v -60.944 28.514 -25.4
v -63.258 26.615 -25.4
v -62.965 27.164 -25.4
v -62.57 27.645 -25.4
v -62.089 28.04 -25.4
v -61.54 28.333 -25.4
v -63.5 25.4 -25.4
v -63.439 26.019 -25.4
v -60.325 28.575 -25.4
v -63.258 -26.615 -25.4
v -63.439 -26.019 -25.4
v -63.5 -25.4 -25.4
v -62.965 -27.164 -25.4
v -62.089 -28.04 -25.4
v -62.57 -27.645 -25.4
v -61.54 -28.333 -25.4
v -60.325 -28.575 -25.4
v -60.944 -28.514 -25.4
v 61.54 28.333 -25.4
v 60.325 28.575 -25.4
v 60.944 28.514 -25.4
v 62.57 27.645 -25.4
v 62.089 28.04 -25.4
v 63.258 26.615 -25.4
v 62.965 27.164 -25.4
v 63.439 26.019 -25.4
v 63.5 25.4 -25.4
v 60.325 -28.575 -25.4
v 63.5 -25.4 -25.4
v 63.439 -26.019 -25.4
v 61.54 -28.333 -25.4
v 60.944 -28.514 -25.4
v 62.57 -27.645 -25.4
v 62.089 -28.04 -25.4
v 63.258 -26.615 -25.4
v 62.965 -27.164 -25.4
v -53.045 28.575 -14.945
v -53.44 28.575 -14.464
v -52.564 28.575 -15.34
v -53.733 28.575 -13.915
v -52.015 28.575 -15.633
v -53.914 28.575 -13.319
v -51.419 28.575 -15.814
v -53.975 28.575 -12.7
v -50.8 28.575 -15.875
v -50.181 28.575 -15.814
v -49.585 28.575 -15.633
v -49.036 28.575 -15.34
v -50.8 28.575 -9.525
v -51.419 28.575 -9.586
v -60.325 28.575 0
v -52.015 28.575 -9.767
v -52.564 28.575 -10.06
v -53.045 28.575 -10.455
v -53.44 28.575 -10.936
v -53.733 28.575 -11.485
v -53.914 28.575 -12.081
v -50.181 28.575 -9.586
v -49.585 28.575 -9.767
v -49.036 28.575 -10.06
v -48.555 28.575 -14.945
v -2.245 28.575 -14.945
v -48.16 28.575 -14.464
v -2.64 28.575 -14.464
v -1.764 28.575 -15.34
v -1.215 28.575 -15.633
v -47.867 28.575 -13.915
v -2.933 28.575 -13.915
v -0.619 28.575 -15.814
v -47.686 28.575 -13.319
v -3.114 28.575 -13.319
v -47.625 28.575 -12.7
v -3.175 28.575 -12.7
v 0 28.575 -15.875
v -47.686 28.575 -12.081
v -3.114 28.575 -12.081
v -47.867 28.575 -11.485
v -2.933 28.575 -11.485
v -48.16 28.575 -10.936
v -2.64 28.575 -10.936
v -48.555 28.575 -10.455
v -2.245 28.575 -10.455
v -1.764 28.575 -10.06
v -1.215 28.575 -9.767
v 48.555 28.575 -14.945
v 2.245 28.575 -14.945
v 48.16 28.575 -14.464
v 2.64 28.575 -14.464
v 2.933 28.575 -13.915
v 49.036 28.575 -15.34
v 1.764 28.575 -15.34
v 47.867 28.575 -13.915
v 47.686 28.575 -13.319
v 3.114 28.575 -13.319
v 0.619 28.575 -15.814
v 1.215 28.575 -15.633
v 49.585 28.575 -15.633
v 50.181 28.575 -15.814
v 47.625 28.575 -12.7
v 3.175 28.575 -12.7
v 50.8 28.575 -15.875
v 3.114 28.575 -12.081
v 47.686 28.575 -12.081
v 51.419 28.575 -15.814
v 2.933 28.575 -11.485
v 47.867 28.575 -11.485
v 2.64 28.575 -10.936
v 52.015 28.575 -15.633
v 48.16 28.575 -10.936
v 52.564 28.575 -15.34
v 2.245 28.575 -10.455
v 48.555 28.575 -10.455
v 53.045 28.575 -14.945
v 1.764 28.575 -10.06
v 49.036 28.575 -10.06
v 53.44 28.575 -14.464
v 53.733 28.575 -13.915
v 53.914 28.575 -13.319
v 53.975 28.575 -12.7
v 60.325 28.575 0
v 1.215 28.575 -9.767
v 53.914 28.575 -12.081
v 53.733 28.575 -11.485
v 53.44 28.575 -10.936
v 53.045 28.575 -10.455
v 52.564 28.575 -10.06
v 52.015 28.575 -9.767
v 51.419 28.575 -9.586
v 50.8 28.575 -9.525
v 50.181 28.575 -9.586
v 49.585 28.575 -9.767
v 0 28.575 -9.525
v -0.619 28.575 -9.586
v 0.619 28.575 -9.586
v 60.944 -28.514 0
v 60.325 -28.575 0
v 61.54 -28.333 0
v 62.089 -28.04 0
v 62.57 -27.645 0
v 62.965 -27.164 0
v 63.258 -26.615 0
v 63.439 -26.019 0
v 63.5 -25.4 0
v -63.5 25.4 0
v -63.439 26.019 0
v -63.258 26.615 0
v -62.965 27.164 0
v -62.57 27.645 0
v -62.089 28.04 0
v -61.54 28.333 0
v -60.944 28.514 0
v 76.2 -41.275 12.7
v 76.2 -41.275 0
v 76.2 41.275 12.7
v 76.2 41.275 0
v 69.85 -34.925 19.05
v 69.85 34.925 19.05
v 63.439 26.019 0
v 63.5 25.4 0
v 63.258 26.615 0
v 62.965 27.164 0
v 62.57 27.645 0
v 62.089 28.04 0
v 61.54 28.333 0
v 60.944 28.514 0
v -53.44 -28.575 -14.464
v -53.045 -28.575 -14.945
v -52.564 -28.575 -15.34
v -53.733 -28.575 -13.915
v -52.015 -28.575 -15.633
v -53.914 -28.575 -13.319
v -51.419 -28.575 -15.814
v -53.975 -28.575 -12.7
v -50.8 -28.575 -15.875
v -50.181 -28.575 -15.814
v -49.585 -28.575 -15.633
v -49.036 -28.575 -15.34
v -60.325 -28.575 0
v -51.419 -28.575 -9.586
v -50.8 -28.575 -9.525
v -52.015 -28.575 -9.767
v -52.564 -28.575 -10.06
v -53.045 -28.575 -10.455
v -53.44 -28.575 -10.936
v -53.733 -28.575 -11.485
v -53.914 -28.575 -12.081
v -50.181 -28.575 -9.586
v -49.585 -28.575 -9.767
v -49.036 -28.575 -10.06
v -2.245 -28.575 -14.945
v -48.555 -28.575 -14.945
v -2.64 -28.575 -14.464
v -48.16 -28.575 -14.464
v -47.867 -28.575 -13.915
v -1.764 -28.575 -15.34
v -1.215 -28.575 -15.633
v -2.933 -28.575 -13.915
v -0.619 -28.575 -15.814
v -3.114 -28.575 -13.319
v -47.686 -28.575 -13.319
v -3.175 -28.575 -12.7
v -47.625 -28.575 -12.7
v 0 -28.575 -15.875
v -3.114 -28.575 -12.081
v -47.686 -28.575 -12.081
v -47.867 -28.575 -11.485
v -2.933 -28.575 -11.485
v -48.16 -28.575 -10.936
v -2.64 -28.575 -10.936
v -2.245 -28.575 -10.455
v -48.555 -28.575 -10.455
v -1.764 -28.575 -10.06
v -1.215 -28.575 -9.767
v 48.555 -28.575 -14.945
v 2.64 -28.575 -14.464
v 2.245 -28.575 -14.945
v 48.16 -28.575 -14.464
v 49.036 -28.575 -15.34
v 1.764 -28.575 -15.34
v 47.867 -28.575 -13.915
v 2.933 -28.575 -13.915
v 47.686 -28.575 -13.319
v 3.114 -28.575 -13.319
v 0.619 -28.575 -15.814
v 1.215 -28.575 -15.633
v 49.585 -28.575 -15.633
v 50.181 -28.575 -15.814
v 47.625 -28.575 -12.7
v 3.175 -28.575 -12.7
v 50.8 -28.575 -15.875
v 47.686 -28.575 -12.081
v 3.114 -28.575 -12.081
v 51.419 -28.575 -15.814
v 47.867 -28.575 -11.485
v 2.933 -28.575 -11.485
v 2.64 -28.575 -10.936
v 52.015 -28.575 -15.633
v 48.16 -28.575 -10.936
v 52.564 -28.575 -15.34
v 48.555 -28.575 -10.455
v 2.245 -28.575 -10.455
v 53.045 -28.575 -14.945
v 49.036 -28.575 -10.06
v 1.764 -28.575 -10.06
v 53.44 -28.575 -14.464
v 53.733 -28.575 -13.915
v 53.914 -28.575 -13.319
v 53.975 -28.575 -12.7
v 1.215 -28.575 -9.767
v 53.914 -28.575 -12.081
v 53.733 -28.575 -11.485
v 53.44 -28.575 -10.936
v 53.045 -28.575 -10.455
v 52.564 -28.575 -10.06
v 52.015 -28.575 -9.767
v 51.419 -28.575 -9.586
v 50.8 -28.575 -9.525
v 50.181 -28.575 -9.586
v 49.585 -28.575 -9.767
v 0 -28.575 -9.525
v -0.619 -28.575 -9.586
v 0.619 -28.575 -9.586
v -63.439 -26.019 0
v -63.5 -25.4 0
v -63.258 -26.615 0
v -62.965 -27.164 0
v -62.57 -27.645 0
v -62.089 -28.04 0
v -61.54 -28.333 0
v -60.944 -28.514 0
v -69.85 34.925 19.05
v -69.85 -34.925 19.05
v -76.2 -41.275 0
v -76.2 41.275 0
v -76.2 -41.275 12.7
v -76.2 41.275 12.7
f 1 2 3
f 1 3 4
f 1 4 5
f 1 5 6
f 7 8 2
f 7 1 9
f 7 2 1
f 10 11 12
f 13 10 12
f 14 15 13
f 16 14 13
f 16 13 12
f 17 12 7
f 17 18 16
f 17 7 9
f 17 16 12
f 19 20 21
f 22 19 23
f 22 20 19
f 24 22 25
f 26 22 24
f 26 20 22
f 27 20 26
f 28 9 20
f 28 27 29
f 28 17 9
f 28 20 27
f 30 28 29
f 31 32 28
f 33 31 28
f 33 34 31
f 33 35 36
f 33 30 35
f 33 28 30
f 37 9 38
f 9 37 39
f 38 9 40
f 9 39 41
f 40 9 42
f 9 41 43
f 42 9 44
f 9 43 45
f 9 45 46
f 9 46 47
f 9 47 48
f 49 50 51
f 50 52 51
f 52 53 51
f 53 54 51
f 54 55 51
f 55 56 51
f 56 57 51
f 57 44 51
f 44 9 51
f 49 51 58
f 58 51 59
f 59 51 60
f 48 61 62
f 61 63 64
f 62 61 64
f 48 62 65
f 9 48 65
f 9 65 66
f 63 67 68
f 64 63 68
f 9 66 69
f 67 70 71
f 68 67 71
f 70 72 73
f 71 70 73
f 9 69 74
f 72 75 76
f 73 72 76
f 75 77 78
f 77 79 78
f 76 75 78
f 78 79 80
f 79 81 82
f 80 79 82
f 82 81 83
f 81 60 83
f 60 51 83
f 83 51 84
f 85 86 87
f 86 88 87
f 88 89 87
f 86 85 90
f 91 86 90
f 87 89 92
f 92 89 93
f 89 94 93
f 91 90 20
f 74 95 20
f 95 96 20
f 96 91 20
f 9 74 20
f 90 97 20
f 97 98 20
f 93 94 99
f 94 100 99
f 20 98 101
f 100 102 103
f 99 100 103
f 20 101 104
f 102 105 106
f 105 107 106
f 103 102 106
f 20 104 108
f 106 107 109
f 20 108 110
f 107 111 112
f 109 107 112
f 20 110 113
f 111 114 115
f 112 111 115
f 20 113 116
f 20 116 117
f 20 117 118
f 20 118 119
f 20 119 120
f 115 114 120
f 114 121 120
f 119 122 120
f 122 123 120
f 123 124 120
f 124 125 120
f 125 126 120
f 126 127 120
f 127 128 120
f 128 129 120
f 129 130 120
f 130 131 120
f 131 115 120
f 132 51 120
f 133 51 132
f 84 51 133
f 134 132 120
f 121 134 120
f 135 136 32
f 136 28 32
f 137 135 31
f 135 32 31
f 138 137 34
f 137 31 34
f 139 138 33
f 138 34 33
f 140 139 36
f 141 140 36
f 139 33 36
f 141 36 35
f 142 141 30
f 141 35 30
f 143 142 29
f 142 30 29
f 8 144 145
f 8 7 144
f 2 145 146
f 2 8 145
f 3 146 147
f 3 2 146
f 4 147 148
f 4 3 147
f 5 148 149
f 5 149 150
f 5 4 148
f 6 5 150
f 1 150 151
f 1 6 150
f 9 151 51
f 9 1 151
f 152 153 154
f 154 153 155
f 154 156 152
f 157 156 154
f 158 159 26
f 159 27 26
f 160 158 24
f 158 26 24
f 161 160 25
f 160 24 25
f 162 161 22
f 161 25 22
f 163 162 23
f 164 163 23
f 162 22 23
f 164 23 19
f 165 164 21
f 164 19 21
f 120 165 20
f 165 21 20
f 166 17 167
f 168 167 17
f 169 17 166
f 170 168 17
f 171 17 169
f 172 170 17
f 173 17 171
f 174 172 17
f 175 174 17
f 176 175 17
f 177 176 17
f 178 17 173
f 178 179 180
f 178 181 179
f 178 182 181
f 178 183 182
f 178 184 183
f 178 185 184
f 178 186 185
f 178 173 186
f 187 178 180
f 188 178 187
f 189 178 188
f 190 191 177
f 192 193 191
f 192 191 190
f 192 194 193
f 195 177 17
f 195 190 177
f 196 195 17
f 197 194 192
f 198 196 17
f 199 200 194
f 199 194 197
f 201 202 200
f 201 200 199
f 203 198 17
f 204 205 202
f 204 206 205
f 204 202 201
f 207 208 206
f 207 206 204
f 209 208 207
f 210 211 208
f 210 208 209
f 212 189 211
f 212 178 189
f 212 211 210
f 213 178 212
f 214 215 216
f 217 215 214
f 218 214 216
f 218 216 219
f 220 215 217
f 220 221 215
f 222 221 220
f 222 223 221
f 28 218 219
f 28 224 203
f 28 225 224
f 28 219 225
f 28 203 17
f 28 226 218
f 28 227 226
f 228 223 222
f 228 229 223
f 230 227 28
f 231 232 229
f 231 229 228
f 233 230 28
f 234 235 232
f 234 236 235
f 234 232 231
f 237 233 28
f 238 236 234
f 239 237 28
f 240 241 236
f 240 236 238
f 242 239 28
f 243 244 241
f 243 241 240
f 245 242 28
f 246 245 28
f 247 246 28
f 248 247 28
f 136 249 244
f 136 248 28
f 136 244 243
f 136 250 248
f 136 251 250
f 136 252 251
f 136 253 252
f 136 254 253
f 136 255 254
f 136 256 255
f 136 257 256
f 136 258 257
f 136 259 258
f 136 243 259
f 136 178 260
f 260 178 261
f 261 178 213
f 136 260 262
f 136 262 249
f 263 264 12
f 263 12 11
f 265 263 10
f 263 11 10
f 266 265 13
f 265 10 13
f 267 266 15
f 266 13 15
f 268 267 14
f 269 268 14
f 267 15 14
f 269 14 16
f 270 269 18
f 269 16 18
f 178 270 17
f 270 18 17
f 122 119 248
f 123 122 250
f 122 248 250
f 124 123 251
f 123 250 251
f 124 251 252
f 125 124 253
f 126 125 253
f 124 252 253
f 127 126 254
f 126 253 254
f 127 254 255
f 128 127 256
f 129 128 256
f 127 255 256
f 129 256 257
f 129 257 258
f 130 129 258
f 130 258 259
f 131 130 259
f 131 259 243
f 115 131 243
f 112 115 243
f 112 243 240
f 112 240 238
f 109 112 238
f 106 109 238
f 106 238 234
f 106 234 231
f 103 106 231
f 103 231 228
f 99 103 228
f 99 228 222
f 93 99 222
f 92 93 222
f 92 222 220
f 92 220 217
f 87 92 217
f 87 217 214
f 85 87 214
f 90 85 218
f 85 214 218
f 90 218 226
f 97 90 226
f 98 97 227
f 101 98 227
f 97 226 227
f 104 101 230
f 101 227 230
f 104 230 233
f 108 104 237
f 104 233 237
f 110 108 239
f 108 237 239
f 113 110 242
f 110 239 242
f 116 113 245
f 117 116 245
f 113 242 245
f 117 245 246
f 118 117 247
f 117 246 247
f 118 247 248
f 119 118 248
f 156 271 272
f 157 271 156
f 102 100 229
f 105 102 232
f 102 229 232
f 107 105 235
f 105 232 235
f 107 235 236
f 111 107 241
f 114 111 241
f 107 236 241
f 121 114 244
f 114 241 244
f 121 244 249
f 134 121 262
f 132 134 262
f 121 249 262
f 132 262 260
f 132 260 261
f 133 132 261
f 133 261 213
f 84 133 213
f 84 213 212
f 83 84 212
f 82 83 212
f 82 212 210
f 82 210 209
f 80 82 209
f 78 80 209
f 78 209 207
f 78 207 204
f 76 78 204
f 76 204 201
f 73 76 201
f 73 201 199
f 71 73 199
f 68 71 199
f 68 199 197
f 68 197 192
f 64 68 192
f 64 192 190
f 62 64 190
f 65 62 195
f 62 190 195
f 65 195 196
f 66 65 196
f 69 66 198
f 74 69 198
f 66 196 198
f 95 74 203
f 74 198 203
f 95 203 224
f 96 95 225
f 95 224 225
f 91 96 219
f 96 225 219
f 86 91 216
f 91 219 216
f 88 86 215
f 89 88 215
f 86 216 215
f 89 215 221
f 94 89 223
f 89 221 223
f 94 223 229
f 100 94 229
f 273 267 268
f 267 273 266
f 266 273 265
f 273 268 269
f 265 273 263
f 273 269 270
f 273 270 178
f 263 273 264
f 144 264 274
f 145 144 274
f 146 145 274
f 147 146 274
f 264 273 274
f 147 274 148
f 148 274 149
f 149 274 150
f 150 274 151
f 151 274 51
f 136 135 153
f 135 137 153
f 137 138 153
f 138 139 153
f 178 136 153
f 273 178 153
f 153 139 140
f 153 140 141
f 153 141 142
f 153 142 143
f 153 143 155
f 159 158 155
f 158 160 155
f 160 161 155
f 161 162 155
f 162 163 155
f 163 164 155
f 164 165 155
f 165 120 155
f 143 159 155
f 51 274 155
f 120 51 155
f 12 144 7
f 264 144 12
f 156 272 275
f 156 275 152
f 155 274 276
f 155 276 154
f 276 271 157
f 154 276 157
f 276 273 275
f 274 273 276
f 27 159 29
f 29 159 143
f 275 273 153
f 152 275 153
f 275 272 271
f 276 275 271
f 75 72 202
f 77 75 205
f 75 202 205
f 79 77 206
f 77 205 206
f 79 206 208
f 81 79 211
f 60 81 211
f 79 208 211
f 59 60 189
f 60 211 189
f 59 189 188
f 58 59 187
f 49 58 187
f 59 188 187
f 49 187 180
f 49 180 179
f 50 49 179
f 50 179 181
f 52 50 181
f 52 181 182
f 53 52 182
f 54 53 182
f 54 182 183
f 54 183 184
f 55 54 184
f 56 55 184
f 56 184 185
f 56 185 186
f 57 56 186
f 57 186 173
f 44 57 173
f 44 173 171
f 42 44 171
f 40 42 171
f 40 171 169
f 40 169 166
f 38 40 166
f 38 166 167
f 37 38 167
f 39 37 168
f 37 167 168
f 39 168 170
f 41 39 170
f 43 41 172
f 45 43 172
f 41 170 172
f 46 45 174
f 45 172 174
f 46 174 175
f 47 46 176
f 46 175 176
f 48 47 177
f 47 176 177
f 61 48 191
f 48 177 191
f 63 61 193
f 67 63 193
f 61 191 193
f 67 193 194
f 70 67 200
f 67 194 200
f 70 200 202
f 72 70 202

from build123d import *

# Parameters (mm, degrees)
F0_W     = 152.4
F0_H     = 82.55
F1_DEPTH = 19.05
F2_SIZE  = 6.35
F3_W     = 127
F3_H     = 57.15
F4_DEPTH = 25.4
F5_R     = 3.175
F6_DEPTH = 69.851
F7_R     = 3.175


with BuildPart() as f1:
    # F0 (on Top) → F1 (new body)
    with BuildSketch(Plane.XY):
        Rectangle(F0_W, F0_H)
    extrude(amount=F1_DEPTH)

    # F2
    f2_edges = [f1.edges().sort_by_distance(p)[0] for p in [
        (0, 41.275, 19.05),
        (-76.2, 0, 19.05),
        (0, -41.275, 19.05),
        (76.2, 0, 19.05),
    ]]
    chamfer(f2_edges, length=F2_SIZE)

    # F3 (on face) → F4 (join)
    with BuildSketch(Plane(origin=(0, 0, 0), x_dir=(1, 0, 0), z_dir=(0, 0, -1))):
        Rectangle(F3_W, F3_H)
    extrude(amount=F4_DEPTH)

    # F5 (on face) → F6 (cut, through all)
    with BuildSketch(Plane.XZ.offset(28.575)):
        with Locations((-50.8, -12.7)):
            Circle(F5_R)
        with Locations((0, -12.7)):
            Circle(F5_R)
        with Locations((50.8, -12.7)):
            Circle(F5_R)
    extrude(amount=-F6_DEPTH, mode=Mode.SUBTRACT)

    # F7
    f7_edges = [f1.edges().sort_by_distance(p)[0] for p in [
        (-63.5, -28.575, -12.7),
        (63.5, -28.575, -12.7),
        (-63.5, 28.575, -12.7),
        (63.5, 28.575, -12.7),
    ]]
    fillet(f7_edges, radius=F7_R)


solid = f1.part
